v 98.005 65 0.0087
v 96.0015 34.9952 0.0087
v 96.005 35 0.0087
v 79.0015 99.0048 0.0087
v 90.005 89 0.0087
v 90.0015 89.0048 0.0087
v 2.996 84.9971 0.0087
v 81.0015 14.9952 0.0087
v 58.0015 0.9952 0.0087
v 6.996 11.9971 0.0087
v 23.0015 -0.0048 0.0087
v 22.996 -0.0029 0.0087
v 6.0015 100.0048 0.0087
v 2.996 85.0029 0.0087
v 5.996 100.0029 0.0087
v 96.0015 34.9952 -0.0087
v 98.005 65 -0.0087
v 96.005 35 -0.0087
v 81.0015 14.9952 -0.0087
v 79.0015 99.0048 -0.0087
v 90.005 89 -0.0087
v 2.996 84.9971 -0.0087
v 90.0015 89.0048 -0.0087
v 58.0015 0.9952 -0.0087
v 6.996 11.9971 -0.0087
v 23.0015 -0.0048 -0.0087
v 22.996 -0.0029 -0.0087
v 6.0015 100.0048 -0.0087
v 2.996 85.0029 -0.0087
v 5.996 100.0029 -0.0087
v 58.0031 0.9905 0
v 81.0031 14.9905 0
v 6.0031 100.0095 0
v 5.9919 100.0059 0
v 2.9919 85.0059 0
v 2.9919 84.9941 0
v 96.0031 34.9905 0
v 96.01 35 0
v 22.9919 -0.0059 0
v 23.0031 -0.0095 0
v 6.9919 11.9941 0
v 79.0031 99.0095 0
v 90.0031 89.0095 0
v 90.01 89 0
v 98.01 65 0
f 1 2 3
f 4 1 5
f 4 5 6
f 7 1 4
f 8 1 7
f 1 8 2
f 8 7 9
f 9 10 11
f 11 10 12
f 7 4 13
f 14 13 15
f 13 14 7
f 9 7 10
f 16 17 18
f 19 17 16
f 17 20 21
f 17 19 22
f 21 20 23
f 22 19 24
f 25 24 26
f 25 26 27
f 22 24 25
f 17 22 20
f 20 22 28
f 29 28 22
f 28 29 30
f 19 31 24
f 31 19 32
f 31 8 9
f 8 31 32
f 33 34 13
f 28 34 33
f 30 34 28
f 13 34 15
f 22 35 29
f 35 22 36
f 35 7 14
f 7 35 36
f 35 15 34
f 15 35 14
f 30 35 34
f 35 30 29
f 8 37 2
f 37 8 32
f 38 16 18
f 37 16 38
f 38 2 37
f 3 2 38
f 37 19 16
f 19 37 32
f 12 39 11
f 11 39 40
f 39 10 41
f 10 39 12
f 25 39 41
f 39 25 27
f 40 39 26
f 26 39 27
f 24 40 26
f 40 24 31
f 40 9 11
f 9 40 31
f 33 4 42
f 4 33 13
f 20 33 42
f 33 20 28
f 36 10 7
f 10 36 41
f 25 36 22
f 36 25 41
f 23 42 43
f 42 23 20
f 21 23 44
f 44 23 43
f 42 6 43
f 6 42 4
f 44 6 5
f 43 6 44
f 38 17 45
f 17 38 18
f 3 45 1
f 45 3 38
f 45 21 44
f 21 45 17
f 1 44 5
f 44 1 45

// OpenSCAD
color([0.5839405385485582,0.4048698908705002,0.6877557316706271]) hull(){
    translate([18,58]) sphere(0.01);
    translate([18,24]) sphere(0.01);
    translate([26,51]) sphere(0.01);
}
color([0.29310936231965135,0.08456113000314536,0.6409271470126323]) hull(){
    translate([18,58]) sphere(0.01);
    translate([18,24]) sphere(0.01);
    translate([7,12]) sphere(0.01);
}
color([0.38512246522478266,0.6162859510128613,0.407224705538046]) hull(){
    translate([18,58]) sphere(0.01);
    translate([26,51]) sphere(0.01);
    translate([30,57]) sphere(0.01);
}
color([0.6107800780239486,0.9541913078580654,0.09369719926319908]) hull(){
    translate([18,58]) sphere(0.01);
    translate([30,57]) sphere(0.01);
    translate([16,79]) sphere(0.01);
}
color([0.4396226851829427,0.9817497074141792,0.30111933510979894]) hull(){
    translate([18,58]) sphere(0.01);
    translate([16,79]) sphere(0.01);
    translate([6,77]) sphere(0.01);
}
color([0.08571041628526821,0.691130580335744,0.16573157374072334]) hull(){
    translate([18,58]) sphere(0.01);
    translate([6,77]) sphere(0.01);
    translate([7,12]) sphere(0.01);
}
color([0.4668304924867862,0.30100213617539295,0.3511677492745029]) hull(){
    translate([58,98]) sphere(0.01);
    translate([50,93]) sphere(0.01);
    translate([64,91]) sphere(0.01);
}
color([0.05564944269037686,0.7696481469448815,0.686275624239137]) hull(){
    translate([58,98]) sphere(0.01);
    translate([50,93]) sphere(0.01);
    translate([51,97]) sphere(0.01);
}
color([0.15447252119296884,0.35335085758162643,0.18799175914388588]) hull(){
    translate([58,98]) sphere(0.01);
    translate([39,98]) sphere(0.01);
    translate([18,99]) sphere(0.01);
}
color([0.41322879780265653,0.82270842281296,0.9057146612667819]) hull(){
    translate([58,98]) sphere(0.01);
    translate([39,98]) sphere(0.01);
    translate([51,97]) sphere(0.01);
}
color([0.9688547633127277,0.5528378273263655,0.12760284187612392]) hull(){
    translate([58,98]) sphere(0.01);
    translate([18,99]) sphere(0.01);
    translate([79,99]) sphere(0.01);
}
color([0.1710979555253146,0.7131998843266452,0.6397779425125977]) hull(){
    translate([58,98]) sphere(0.01);
    translate([70,96]) sphere(0.01);
    translate([79,99]) sphere(0.01);
}
color([0.57496968906483,0.8489371230716904,0.07944838941339594]) hull(){
    translate([58,98]) sphere(0.01);
    translate([70,96]) sphere(0.01);
    translate([64,91]) sphere(0.01);
}
color([0.040333123224873146,0.9305910632054132,0.3080440975445232]) hull(){
    translate([22,90]) sphere(0.01);
    translate([20,83]) sphere(0.01);
    translate([30,90]) sphere(0.01);
}
color([0.6084655882345898,0.4923441190446234,0.7069385087242315]) hull(){
    translate([22,90]) sphere(0.01);
    translate([20,83]) sphere(0.01);
    translate([15,91]) sphere(0.01);
}
color([0.6803385961846494,0.18024793645131376,0.10787678186317007]) hull(){
    translate([22,90]) sphere(0.01);
    translate([18,99]) sphere(0.01);
    translate([31,91]) sphere(0.01);
}
color([0.1335624130282893,0.47731112778056706,0.8393950916733898]) hull(){
    translate([22,90]) sphere(0.01);
    translate([18,99]) sphere(0.01);
    translate([15,91]) sphere(0.01);
}
color([0.6780893207968227,0.08337096158279222,0.27725115680544954]) hull(){
    translate([22,90]) sphere(0.01);
    translate([31,91]) sphere(0.01);
    translate([30,90]) sphere(0.01);
}
color([0.9965791662073833,0.03375154870506614,0.10494976972159242]) hull(){
    translate([50,93]) sphere(0.01);
    translate([39,98]) sphere(0.01);
    translate([37,88]) sphere(0.01);
}
color([0.516844917539197,0.1360610465034362,0.543805910213663]) hull(){
    translate([50,93]) sphere(0.01);
    translate([39,98]) sphere(0.01);
    translate([51,97]) sphere(0.01);
}
color([0.04901628196141694,0.4867102513994055,0.8813892002857401]) hull(){
    translate([50,93]) sphere(0.01);
    translate([59,71]) sphere(0.01);
    translate([38,83]) sphere(0.01);
}
color([0.3053751014353143,0.40772022041766365,0.31297204198076634]) hull(){
    translate([50,93]) sphere(0.01);
    translate([59,71]) sphere(0.01);
    translate([63,74]) sphere(0.01);
}
color([0.49907796034366436,0.6160709555012981,0.9916538905911245]) hull(){
    translate([50,93]) sphere(0.01);
    translate([64,91]) sphere(0.01);
    translate([63,74]) sphere(0.01);
}
color([0.3123575451593331,0.46364206475662195,0.8862899719975306]) hull(){
    translate([50,93]) sphere(0.01);
    translate([37,88]) sphere(0.01);
    translate([38,83]) sphere(0.01);
}
color([0.5738800220993816,0.8494037217359881,0.24323676398212035]) hull(){
    translate([44,55]) sphere(0.01);
    translate([44,47]) sphere(0.01);
    translate([35,48]) sphere(0.01);
}
color([0.8402878098664139,0.9530478541805099,0.16594803365564914]) hull(){
    translate([44,55]) sphere(0.01);
    translate([44,47]) sphere(0.01);
    translate([77,50]) sphere(0.01);
}
color([0.0023370868964924796,0.7387895340607371,0.5374530602666081]) hull(){
    translate([44,55]) sphere(0.01);
    translate([35,48]) sphere(0.01);
    translate([30,57]) sphere(0.01);
}
color([0.25604025835089217,0.4320068924153808,0.5112453323210508]) hull(){
    translate([44,55]) sphere(0.01);
    translate([77,50]) sphere(0.01);
    translate([46,61]) sphere(0.01);
}
color([0.7462272619347637,0.5039790716190428,0.8850839351693509]) hull(){
    translate([44,55]) sphere(0.01);
    translate([30,57]) sphere(0.01);
    translate([39,67]) sphere(0.01);
}
color([0.6652757233710683,0.22263754843686523,0.08942086350367451]) hull(){
    translate([44,55]) sphere(0.01);
    translate([46,61]) sphere(0.01);
    translate([39,67]) sphere(0.01);
}
color([0.6195232841458308,0.9036720387350747,0.7222923954673625]) hull(){
    translate([64,14]) sphere(0.01);
    translate([68,15]) sphere(0.01);
    translate([72,20]) sphere(0.01);
}
color([0.6665075097113882,0.5421139713900744,0.6943978877819516]) hull(){
    translate([64,14]) sphere(0.01);
    translate([68,15]) sphere(0.01);
    translate([58,1]) sphere(0.01);
}
color([0.9269770591996176,0.12480324665016229,0.8422397758241813]) hull(){
    translate([64,14]) sphere(0.01);
    translate([58,33]) sphere(0.01);
    translate([72,20]) sphere(0.01);
}
color([0.028249143050612435,0.8554899328562455,0.6212809598996976]) hull(){
    translate([64,14]) sphere(0.01);
    translate([58,33]) sphere(0.01);
    translate([55,32]) sphere(0.01);
}
color([0.6435486749275994,0.4857227915978113,0.2898251547629681]) hull(){
    translate([64,14]) sphere(0.01);
    translate([42,29]) sphere(0.01);
    translate([55,32]) sphere(0.01);
}
color([0.21709076393122206,0.4979948584580751,0.6176241526046676]) hull(){
    translate([64,14]) sphere(0.01);
    translate([42,29]) sphere(0.01);
    translate([32,18]) sphere(0.01);
}
color([0.4722249532281336,0.7228331534363125,0.6109414561657331]) hull(){
    translate([64,14]) sphere(0.01);
    translate([32,18]) sphere(0.01);
    translate([58,1]) sphere(0.01);
}
color([0.5330085163671737,0.6769359871291822,0.5973748769978083]) hull(){
    translate([68,15]) sphere(0.01);
    translate([81,15]) sphere(0.01);
    translate([72,20]) sphere(0.01);
}
color([0.14460255854654236,0.21273280877313017,0.8417179364881341]) hull(){
    translate([68,15]) sphere(0.01);
    translate([81,15]) sphere(0.01);
    translate([58,1]) sphere(0.01);
}
color([0.6300391880279899,0.5103677782275869,0.4479627161837708]) hull(){
    translate([10,94]) sphere(0.01);
    translate([18,99]) sphere(0.01);
    translate([15,91]) sphere(0.01);
}
color([0.2903518628620462,0.1744676713524972,0.5457372127765215]) hull(){
    translate([10,94]) sphere(0.01);
    translate([18,99]) sphere(0.01);
    translate([6,100]) sphere(0.01);
}
color([0.6340658375422632,0.7004271366493812,0.690956934786038]) hull(){
    translate([10,94]) sphere(0.01);
    translate([3,85]) sphere(0.01);
    translate([7,86]) sphere(0.01);
}
color([0.013948469234104865,0.8018456354370093,0.2607079205191076]) hull(){
    translate([10,94]) sphere(0.01);
    translate([3,85]) sphere(0.01);
    translate([6,100]) sphere(0.01);
}
color([0.01899716010339858,0.7507132946374245,0.44168653561511173]) hull(){
    translate([10,94]) sphere(0.01);
    translate([7,86]) sphere(0.01);
    translate([15,91]) sphere(0.01);
}
color([0.1668653701245908,0.45955837321901094,0.7876756969907556]) hull(){
    translate([58,33]) sphere(0.01);
    translate([44,47]) sphere(0.01);
    translate([74,41]) sphere(0.01);
}
color([0.09564527702692727,0.06733136152719421,0.7816649665975636]) hull(){
    translate([58,33]) sphere(0.01);
    translate([44,47]) sphere(0.01);
    translate([45,42]) sphere(0.01);
}
color([0.030385075649315252,0.33346286891595733,0.08647112242809318]) hull(){
    translate([58,33]) sphere(0.01);
    translate([72,20]) sphere(0.01);
    translate([76,28]) sphere(0.01);
}
color([0.8161439782233904,0.05657658467482607,0.8243668117903717]) hull(){
    translate([58,33]) sphere(0.01);
    translate([55,32]) sphere(0.01);
    translate([45,42]) sphere(0.01);
}
color([0.05808931884644186,0.6181904095369413,0.1426995958976538]) hull(){
    translate([58,33]) sphere(0.01);
    translate([74,41]) sphere(0.01);
    translate([76,28]) sphere(0.01);
}
color([0.3846464495954227,0.3794414211645075,0.7643773332264734]) hull(){
    translate([6,84]) sphere(0.01);
    translate([3,85]) sphere(0.01);
    translate([6,77]) sphere(0.01);
}
color([0.3116889002403487,0.7690158776827113,0.7674729074453902]) hull(){
    translate([6,84]) sphere(0.01);
    translate([3,85]) sphere(0.01);
    translate([7,86]) sphere(0.01);
}
color([0.3394448706328078,0.45855440081433096,0.0007502935671159783]) hull(){
    translate([6,84]) sphere(0.01);
    translate([16,79]) sphere(0.01);
    translate([6,77]) sphere(0.01);
}
color([0.8084995756647368,0.0331322283588068,0.9954935019736515]) hull(){
    translate([6,84]) sphere(0.01);
    translate([16,79]) sphere(0.01);
    translate([7,86]) sphere(0.01);
}
color([0.32750610520168044,0.511786711221762,0.09639677946248049]) hull(){
    translate([82,26]) sphere(0.01);
    translate([81,15]) sphere(0.01);
    translate([96,35]) sphere(0.01);
}
color([0.46647601470953737,0.043404226035316795,0.8089506697449751]) hull(){
    translate([82,26]) sphere(0.01);
    translate([81,15]) sphere(0.01);
    translate([79,27]) sphere(0.01);
}
color([0.9065579579370614,0.48874197586323487,0.4689182776921319]) hull(){
    translate([82,26]) sphere(0.01);
    translate([75,43]) sphere(0.01);
    translate([74,41]) sphere(0.01);
}
color([0.9999833648369341,0.42392948264922625,0.11056216143511133]) hull(){
    translate([82,26]) sphere(0.01);
    translate([75,43]) sphere(0.01);
    translate([96,35]) sphere(0.01);
}
color([0.5007484231317689,0.23725843071495933,0.7435751616565288]) hull(){
    translate([82,26]) sphere(0.01);
    translate([74,41]) sphere(0.01);
    translate([79,27]) sphere(0.01);
}
color([0.030326511183225713,0.9534383365251057,0.44454391677925087]) hull(){
    translate([42,29]) sphere(0.01);
    translate([26,22]) sphere(0.01);
    translate([35,48]) sphere(0.01);
}
color([0.4017260225039573,0.6984802625757133,0.14751428227125585]) hull(){
    translate([42,29]) sphere(0.01);
    translate([26,22]) sphere(0.01);
    translate([32,18]) sphere(0.01);
}
color([0.592053202978914,0.7602792343344718,0.23214841748979886]) hull(){
    translate([42,29]) sphere(0.01);
    translate([35,48]) sphere(0.01);
    translate([45,42]) sphere(0.01);
}
color([0.2215781656479593,0.24536616409996503,0.7021925659500807]) hull(){
    translate([42,29]) sphere(0.01);
    translate([55,32]) sphere(0.01);
    translate([45,42]) sphere(0.01);
}
color([0.5457605096294114,0.54011508338913,0.5459453680001618]) hull(){
    translate([39,98]) sphere(0.01);
    translate([18,99]) sphere(0.01);
    translate([31,91]) sphere(0.01);
}
color([0.21439919344985514,0.4167057873106884,0.6193494045718565]) hull(){
    translate([39,98]) sphere(0.01);
    translate([31,91]) sphere(0.01);
    translate([37,88]) sphere(0.01);
}
color([0.45760594266221877,0.8933837090972113,0.8109172526149769]) hull(){
    translate([26,22]) sphere(0.01);
    translate([18,24]) sphere(0.01);
    translate([26,51]) sphere(0.01);
}
color([0.14833972802097417,0.6068004170768148,0.5080529466064481]) hull(){
    translate([26,22]) sphere(0.01);
    translate([18,24]) sphere(0.01);
    translate([24,21]) sphere(0.01);
}
color([0.9906187087676633,0.11352393843166497,0.6883720652754897]) hull(){
    translate([26,22]) sphere(0.01);
    translate([26,51]) sphere(0.01);
    translate([35,48]) sphere(0.01);
}
color([0.5952346609945763,0.6540807806784664,0.3474259839548979]) hull(){
    translate([26,22]) sphere(0.01);
    translate([24,21]) sphere(0.01);
    translate([32,18]) sphere(0.01);
}
color([0.9928586924360654,0.247192741454632,0.70975753974483]) hull(){
    translate([18,24]) sphere(0.01);
    translate([24,21]) sphere(0.01);
    translate([21,6]) sphere(0.01);
}
color([0.13794757021236903,0.4611444179186315,0.04899626755467579]) hull(){
    translate([18,24]) sphere(0.01);
    translate([7,12]) sphere(0.01);
    translate([21,6]) sphere(0.01);
}
color([0.1977229983916683,0.036370797334404625,0.13840798504488894]) hull(){
    translate([44,47]) sphere(0.01);
    translate([35,48]) sphere(0.01);
    translate([45,42]) sphere(0.01);
}
color([0.695134065044521,0.2654011745990712,0.4635417367699751]) hull(){
    translate([44,47]) sphere(0.01);
    translate([77,50]) sphere(0.01);
    translate([75,43]) sphere(0.01);
}
color([0.14067843926211876,0.3233092624720053,0.6766209265725885]) hull(){
    translate([44,47]) sphere(0.01);
    translate([75,43]) sphere(0.01);
    translate([74,41]) sphere(0.01);
}
color([0.5598941248919586,0.2674263193966361,0.7715367321750608]) hull(){
    translate([80,52]) sphere(0.01);
    translate([77,50]) sphere(0.01);
    translate([81,49]) sphere(0.01);
}
color([0.7775867750177572,0.3358457771023752,0.7984986383285079]) hull(){
    translate([80,52]) sphere(0.01);
    translate([77,50]) sphere(0.01);
    translate([63,74]) sphere(0.01);
}
color([0.3608344962449672,0.130636609727118,0.1470050456404287]) hull(){
    translate([80,52]) sphere(0.01);
    translate([81,49]) sphere(0.01);
    translate([91,55]) sphere(0.01);
}
color([0.5817121628313788,0.46286602772829477,0.8824527290015699]) hull(){
    translate([80,52]) sphere(0.01);
    translate([91,55]) sphere(0.01);
    translate([93,72]) sphere(0.01);
}
color([0.1201105517589024,0.1938197880719691,0.4695931850983104]) hull(){
    translate([80,52]) sphere(0.01);
    translate([63,74]) sphere(0.01);
    translate([93,72]) sphere(0.01);
}
color([0.14078313852784263,0.6451769219884874,0.9811903017448982]) hull(){
    translate([26,51]) sphere(0.01);
    translate([35,48]) sphere(0.01);
    translate([30,57]) sphere(0.01);
}
color([0.8740229692652243,0.6541461711493592,0.21289315855754942]) hull(){
    translate([59,71]) sphere(0.01);
    translate([77,50]) sphere(0.01);
    translate([46,61]) sphere(0.01);
}
color([0.9328418457966335,0.42345059226773774,0.5012376899041451]) hull(){
    translate([59,71]) sphere(0.01);
    translate([77,50]) sphere(0.01);
    translate([63,74]) sphere(0.01);
}
color([0.5811541702347708,0.2791891573101454,0.2092311813057095]) hull(){
    translate([59,71]) sphere(0.01);
    translate([43,69]) sphere(0.01);
    translate([46,61]) sphere(0.01);
}
color([0.9628933046967749,0.6198760626942967,0.5999578261672418]) hull(){
    translate([59,71]) sphere(0.01);
    translate([43,69]) sphere(0.01);
    translate([38,83]) sphere(0.01);
}
color([0.23874719597172656,0.5159213977515871,0.8042715508319355]) hull(){
    translate([20,83]) sphere(0.01);
    translate([16,79]) sphere(0.01);
    translate([15,91]) sphere(0.01);
}
color([0.6755197251802578,0.41487488756696345,0.5733633065217538]) hull(){
    translate([20,83]) sphere(0.01);
    translate([16,79]) sphere(0.01);
    translate([39,67]) sphere(0.01);
}
color([0.8352652083788017,0.4789645616530247,0.8888242662849705]) hull(){
    translate([20,83]) sphere(0.01);
    translate([38,83]) sphere(0.01);
    translate([30,90]) sphere(0.01);
}
color([0.7977003312522131,0.4430245559395397,0.5757872208285841]) hull(){
    translate([20,83]) sphere(0.01);
    translate([38,83]) sphere(0.01);
    translate([39,67]) sphere(0.01);
}
color([0.18894415855786206,0.8084526775944827,0.5240727557148024]) hull(){
    translate([81,15]) sphere(0.01);
    translate([72,20]) sphere(0.01);
    translate([79,27]) sphere(0.01);
}
color([0.33009817895383553,0.6358447971330878,0.274476683198677]) hull(){
    translate([23,0]) sphere(0.01);
    translate([7,12]) sphere(0.01);
    translate([21,6]) sphere(0.01);
}
color([0.7036882936284021,0.9548751840233447,0.5755708060880032]) hull(){
    translate([23,0]) sphere(0.01);
    translate([32,18]) sphere(0.01);
    translate([21,6]) sphere(0.01);
}
color([0.41204698353559877,0.5796286851254486,0.28286322414623355]) hull(){
    translate([23,0]) sphere(0.01);
    translate([32,18]) sphere(0.01);
    translate([58,1]) sphere(0.01);
}
color([0.83488960487533,0.7968053445508819,0.9111606805714901]) hull(){
    translate([77,50]) sphere(0.01);
    translate([81,49]) sphere(0.01);
    translate([75,43]) sphere(0.01);
}
color([0.24277728252059738,0.2698201644401115,0.25372921938475945]) hull(){
    translate([18,99]) sphere(0.01);
    translate([79,99]) sphere(0.01);
    translate([6,100]) sphere(0.01);
}
color([0.3248429479181304,0.33731838939050207,0.46012102584031667]) hull(){
    translate([72,20]) sphere(0.01);
    translate([76,28]) sphere(0.01);
    translate([79,27]) sphere(0.01);
}
color([0.4972140619467261,0.4460540182101679,0.582257111213957]) hull(){
    translate([24,21]) sphere(0.01);
    translate([32,18]) sphere(0.01);
    translate([21,6]) sphere(0.01);
}
color([0.38189019333285656,0.9329183366158048,0.74346568951076]) hull(){
    translate([3,85]) sphere(0.01);
    translate([6,77]) sphere(0.01);
    translate([7,12]) sphere(0.01);
}
color([0.10367473231816282,0.6513301228797536,0.21210212161149367]) hull(){
    translate([30,57]) sphere(0.01);
    translate([16,79]) sphere(0.01);
    translate([39,67]) sphere(0.01);
}
color([0.4071949612628585,0.6715659813617996,0.17871221391606673]) hull(){
    translate([81,49]) sphere(0.01);
    translate([75,43]) sphere(0.01);
    translate([96,35]) sphere(0.01);
}
color([0.17752412341011714,0.6556599876579107,0.7040052939421468]) hull(){
    translate([81,49]) sphere(0.01);
    translate([91,55]) sphere(0.01);
    translate([96,35]) sphere(0.01);
}
color([0.9236087761692187,0.21340315940002685,0.5989435772305987]) hull(){
    translate([16,79]) sphere(0.01);
    translate([7,86]) sphere(0.01);
    translate([15,91]) sphere(0.01);
}
color([0.8450733127471588,0.6003349610680997,0.5954496070156984]) hull(){
    translate([70,96]) sphere(0.01);
    translate([79,99]) sphere(0.01);
    translate([83,95]) sphere(0.01);
}
color([0.920709623693076,0.4233833186292486,0.4754938941291812]) hull(){
    translate([70,96]) sphere(0.01);
    translate([64,91]) sphere(0.01);
    translate([67,87]) sphere(0.01);
}
color([0.872421437716006,0.9767589381362137,0.9086126193256788]) hull(){
    translate([70,96]) sphere(0.01);
    translate([67,87]) sphere(0.01);
    translate([83,95]) sphere(0.01);
}
color([0.7884233486788577,0.8262914624918754,0.6636415038118221]) hull(){
    translate([31,91]) sphere(0.01);
    translate([37,88]) sphere(0.01);
    translate([30,90]) sphere(0.01);
}
color([0.36270118963089737,0.5138414630226216,0.14357255994509865]) hull(){
    translate([79,99]) sphere(0.01);
    translate([90,89]) sphere(0.01);
    translate([83,95]) sphere(0.01);
}
color([0.466624584989368,0.29734697142143796,0.9844700368526675]) hull(){
    translate([64,91]) sphere(0.01);
    translate([67,87]) sphere(0.01);
    translate([63,74]) sphere(0.01);
}
color([0.6752891164641136,0.29017518075598103,0.4342964607752302]) hull(){
    translate([37,88]) sphere(0.01);
    translate([38,83]) sphere(0.01);
    translate([30,90]) sphere(0.01);
}
color([0.773003957160343,0.565247166210502,0.9239404304157245]) hull(){
    translate([67,87]) sphere(0.01);
    translate([63,74]) sphere(0.01);
    translate([93,72]) sphere(0.01);
}
color([0.16032310979410902,0.8355206000915061,0.5688487402091276]) hull(){
    translate([67,87]) sphere(0.01);
    translate([90,89]) sphere(0.01);
    translate([83,95]) sphere(0.01);
}
color([0.20030491603062106,0.9799112189115262,0.7788088383598656]) hull(){
    translate([67,87]) sphere(0.01);
    translate([90,89]) sphere(0.01);
    translate([93,72]) sphere(0.01);
}
color([0.3331229107175697,0.956723341350572,0.8892995412421422]) hull(){
    translate([43,69]) sphere(0.01);
    translate([46,61]) sphere(0.01);
    translate([39,67]) sphere(0.01);
}
color([0.9938355783742772,0.5564778243748569,0.9329279768345969]) hull(){
    translate([43,69]) sphere(0.01);
    translate([38,83]) sphere(0.01);
    translate([39,67]) sphere(0.01);
}
color([0.35340897744289224,0.12062022214202717,0.7238287945893779]) hull(){
    translate([91,55]) sphere(0.01);
    translate([98,65]) sphere(0.01);
    translate([96,35]) sphere(0.01);
}
color([0.8432397019629626,0.2883830928152321,0.23139986036280558]) hull(){
    translate([91,55]) sphere(0.01);
    translate([98,65]) sphere(0.01);
    translate([93,72]) sphere(0.01);
}
color([0.0180364627349191,0.35314011923198985,0.9589424474672257]) hull(){
    translate([98,65]) sphere(0.01);
    translate([90,89]) sphere(0.01);
    translate([93,72]) sphere(0.01);
}
color([0.2619290021782883,0.20369548429490625,0.5420815487250377]) hull(){
    translate([74,41]) sphere(0.01);
    translate([76,28]) sphere(0.01);
    translate([79,27]) sphere(0.01);
}
